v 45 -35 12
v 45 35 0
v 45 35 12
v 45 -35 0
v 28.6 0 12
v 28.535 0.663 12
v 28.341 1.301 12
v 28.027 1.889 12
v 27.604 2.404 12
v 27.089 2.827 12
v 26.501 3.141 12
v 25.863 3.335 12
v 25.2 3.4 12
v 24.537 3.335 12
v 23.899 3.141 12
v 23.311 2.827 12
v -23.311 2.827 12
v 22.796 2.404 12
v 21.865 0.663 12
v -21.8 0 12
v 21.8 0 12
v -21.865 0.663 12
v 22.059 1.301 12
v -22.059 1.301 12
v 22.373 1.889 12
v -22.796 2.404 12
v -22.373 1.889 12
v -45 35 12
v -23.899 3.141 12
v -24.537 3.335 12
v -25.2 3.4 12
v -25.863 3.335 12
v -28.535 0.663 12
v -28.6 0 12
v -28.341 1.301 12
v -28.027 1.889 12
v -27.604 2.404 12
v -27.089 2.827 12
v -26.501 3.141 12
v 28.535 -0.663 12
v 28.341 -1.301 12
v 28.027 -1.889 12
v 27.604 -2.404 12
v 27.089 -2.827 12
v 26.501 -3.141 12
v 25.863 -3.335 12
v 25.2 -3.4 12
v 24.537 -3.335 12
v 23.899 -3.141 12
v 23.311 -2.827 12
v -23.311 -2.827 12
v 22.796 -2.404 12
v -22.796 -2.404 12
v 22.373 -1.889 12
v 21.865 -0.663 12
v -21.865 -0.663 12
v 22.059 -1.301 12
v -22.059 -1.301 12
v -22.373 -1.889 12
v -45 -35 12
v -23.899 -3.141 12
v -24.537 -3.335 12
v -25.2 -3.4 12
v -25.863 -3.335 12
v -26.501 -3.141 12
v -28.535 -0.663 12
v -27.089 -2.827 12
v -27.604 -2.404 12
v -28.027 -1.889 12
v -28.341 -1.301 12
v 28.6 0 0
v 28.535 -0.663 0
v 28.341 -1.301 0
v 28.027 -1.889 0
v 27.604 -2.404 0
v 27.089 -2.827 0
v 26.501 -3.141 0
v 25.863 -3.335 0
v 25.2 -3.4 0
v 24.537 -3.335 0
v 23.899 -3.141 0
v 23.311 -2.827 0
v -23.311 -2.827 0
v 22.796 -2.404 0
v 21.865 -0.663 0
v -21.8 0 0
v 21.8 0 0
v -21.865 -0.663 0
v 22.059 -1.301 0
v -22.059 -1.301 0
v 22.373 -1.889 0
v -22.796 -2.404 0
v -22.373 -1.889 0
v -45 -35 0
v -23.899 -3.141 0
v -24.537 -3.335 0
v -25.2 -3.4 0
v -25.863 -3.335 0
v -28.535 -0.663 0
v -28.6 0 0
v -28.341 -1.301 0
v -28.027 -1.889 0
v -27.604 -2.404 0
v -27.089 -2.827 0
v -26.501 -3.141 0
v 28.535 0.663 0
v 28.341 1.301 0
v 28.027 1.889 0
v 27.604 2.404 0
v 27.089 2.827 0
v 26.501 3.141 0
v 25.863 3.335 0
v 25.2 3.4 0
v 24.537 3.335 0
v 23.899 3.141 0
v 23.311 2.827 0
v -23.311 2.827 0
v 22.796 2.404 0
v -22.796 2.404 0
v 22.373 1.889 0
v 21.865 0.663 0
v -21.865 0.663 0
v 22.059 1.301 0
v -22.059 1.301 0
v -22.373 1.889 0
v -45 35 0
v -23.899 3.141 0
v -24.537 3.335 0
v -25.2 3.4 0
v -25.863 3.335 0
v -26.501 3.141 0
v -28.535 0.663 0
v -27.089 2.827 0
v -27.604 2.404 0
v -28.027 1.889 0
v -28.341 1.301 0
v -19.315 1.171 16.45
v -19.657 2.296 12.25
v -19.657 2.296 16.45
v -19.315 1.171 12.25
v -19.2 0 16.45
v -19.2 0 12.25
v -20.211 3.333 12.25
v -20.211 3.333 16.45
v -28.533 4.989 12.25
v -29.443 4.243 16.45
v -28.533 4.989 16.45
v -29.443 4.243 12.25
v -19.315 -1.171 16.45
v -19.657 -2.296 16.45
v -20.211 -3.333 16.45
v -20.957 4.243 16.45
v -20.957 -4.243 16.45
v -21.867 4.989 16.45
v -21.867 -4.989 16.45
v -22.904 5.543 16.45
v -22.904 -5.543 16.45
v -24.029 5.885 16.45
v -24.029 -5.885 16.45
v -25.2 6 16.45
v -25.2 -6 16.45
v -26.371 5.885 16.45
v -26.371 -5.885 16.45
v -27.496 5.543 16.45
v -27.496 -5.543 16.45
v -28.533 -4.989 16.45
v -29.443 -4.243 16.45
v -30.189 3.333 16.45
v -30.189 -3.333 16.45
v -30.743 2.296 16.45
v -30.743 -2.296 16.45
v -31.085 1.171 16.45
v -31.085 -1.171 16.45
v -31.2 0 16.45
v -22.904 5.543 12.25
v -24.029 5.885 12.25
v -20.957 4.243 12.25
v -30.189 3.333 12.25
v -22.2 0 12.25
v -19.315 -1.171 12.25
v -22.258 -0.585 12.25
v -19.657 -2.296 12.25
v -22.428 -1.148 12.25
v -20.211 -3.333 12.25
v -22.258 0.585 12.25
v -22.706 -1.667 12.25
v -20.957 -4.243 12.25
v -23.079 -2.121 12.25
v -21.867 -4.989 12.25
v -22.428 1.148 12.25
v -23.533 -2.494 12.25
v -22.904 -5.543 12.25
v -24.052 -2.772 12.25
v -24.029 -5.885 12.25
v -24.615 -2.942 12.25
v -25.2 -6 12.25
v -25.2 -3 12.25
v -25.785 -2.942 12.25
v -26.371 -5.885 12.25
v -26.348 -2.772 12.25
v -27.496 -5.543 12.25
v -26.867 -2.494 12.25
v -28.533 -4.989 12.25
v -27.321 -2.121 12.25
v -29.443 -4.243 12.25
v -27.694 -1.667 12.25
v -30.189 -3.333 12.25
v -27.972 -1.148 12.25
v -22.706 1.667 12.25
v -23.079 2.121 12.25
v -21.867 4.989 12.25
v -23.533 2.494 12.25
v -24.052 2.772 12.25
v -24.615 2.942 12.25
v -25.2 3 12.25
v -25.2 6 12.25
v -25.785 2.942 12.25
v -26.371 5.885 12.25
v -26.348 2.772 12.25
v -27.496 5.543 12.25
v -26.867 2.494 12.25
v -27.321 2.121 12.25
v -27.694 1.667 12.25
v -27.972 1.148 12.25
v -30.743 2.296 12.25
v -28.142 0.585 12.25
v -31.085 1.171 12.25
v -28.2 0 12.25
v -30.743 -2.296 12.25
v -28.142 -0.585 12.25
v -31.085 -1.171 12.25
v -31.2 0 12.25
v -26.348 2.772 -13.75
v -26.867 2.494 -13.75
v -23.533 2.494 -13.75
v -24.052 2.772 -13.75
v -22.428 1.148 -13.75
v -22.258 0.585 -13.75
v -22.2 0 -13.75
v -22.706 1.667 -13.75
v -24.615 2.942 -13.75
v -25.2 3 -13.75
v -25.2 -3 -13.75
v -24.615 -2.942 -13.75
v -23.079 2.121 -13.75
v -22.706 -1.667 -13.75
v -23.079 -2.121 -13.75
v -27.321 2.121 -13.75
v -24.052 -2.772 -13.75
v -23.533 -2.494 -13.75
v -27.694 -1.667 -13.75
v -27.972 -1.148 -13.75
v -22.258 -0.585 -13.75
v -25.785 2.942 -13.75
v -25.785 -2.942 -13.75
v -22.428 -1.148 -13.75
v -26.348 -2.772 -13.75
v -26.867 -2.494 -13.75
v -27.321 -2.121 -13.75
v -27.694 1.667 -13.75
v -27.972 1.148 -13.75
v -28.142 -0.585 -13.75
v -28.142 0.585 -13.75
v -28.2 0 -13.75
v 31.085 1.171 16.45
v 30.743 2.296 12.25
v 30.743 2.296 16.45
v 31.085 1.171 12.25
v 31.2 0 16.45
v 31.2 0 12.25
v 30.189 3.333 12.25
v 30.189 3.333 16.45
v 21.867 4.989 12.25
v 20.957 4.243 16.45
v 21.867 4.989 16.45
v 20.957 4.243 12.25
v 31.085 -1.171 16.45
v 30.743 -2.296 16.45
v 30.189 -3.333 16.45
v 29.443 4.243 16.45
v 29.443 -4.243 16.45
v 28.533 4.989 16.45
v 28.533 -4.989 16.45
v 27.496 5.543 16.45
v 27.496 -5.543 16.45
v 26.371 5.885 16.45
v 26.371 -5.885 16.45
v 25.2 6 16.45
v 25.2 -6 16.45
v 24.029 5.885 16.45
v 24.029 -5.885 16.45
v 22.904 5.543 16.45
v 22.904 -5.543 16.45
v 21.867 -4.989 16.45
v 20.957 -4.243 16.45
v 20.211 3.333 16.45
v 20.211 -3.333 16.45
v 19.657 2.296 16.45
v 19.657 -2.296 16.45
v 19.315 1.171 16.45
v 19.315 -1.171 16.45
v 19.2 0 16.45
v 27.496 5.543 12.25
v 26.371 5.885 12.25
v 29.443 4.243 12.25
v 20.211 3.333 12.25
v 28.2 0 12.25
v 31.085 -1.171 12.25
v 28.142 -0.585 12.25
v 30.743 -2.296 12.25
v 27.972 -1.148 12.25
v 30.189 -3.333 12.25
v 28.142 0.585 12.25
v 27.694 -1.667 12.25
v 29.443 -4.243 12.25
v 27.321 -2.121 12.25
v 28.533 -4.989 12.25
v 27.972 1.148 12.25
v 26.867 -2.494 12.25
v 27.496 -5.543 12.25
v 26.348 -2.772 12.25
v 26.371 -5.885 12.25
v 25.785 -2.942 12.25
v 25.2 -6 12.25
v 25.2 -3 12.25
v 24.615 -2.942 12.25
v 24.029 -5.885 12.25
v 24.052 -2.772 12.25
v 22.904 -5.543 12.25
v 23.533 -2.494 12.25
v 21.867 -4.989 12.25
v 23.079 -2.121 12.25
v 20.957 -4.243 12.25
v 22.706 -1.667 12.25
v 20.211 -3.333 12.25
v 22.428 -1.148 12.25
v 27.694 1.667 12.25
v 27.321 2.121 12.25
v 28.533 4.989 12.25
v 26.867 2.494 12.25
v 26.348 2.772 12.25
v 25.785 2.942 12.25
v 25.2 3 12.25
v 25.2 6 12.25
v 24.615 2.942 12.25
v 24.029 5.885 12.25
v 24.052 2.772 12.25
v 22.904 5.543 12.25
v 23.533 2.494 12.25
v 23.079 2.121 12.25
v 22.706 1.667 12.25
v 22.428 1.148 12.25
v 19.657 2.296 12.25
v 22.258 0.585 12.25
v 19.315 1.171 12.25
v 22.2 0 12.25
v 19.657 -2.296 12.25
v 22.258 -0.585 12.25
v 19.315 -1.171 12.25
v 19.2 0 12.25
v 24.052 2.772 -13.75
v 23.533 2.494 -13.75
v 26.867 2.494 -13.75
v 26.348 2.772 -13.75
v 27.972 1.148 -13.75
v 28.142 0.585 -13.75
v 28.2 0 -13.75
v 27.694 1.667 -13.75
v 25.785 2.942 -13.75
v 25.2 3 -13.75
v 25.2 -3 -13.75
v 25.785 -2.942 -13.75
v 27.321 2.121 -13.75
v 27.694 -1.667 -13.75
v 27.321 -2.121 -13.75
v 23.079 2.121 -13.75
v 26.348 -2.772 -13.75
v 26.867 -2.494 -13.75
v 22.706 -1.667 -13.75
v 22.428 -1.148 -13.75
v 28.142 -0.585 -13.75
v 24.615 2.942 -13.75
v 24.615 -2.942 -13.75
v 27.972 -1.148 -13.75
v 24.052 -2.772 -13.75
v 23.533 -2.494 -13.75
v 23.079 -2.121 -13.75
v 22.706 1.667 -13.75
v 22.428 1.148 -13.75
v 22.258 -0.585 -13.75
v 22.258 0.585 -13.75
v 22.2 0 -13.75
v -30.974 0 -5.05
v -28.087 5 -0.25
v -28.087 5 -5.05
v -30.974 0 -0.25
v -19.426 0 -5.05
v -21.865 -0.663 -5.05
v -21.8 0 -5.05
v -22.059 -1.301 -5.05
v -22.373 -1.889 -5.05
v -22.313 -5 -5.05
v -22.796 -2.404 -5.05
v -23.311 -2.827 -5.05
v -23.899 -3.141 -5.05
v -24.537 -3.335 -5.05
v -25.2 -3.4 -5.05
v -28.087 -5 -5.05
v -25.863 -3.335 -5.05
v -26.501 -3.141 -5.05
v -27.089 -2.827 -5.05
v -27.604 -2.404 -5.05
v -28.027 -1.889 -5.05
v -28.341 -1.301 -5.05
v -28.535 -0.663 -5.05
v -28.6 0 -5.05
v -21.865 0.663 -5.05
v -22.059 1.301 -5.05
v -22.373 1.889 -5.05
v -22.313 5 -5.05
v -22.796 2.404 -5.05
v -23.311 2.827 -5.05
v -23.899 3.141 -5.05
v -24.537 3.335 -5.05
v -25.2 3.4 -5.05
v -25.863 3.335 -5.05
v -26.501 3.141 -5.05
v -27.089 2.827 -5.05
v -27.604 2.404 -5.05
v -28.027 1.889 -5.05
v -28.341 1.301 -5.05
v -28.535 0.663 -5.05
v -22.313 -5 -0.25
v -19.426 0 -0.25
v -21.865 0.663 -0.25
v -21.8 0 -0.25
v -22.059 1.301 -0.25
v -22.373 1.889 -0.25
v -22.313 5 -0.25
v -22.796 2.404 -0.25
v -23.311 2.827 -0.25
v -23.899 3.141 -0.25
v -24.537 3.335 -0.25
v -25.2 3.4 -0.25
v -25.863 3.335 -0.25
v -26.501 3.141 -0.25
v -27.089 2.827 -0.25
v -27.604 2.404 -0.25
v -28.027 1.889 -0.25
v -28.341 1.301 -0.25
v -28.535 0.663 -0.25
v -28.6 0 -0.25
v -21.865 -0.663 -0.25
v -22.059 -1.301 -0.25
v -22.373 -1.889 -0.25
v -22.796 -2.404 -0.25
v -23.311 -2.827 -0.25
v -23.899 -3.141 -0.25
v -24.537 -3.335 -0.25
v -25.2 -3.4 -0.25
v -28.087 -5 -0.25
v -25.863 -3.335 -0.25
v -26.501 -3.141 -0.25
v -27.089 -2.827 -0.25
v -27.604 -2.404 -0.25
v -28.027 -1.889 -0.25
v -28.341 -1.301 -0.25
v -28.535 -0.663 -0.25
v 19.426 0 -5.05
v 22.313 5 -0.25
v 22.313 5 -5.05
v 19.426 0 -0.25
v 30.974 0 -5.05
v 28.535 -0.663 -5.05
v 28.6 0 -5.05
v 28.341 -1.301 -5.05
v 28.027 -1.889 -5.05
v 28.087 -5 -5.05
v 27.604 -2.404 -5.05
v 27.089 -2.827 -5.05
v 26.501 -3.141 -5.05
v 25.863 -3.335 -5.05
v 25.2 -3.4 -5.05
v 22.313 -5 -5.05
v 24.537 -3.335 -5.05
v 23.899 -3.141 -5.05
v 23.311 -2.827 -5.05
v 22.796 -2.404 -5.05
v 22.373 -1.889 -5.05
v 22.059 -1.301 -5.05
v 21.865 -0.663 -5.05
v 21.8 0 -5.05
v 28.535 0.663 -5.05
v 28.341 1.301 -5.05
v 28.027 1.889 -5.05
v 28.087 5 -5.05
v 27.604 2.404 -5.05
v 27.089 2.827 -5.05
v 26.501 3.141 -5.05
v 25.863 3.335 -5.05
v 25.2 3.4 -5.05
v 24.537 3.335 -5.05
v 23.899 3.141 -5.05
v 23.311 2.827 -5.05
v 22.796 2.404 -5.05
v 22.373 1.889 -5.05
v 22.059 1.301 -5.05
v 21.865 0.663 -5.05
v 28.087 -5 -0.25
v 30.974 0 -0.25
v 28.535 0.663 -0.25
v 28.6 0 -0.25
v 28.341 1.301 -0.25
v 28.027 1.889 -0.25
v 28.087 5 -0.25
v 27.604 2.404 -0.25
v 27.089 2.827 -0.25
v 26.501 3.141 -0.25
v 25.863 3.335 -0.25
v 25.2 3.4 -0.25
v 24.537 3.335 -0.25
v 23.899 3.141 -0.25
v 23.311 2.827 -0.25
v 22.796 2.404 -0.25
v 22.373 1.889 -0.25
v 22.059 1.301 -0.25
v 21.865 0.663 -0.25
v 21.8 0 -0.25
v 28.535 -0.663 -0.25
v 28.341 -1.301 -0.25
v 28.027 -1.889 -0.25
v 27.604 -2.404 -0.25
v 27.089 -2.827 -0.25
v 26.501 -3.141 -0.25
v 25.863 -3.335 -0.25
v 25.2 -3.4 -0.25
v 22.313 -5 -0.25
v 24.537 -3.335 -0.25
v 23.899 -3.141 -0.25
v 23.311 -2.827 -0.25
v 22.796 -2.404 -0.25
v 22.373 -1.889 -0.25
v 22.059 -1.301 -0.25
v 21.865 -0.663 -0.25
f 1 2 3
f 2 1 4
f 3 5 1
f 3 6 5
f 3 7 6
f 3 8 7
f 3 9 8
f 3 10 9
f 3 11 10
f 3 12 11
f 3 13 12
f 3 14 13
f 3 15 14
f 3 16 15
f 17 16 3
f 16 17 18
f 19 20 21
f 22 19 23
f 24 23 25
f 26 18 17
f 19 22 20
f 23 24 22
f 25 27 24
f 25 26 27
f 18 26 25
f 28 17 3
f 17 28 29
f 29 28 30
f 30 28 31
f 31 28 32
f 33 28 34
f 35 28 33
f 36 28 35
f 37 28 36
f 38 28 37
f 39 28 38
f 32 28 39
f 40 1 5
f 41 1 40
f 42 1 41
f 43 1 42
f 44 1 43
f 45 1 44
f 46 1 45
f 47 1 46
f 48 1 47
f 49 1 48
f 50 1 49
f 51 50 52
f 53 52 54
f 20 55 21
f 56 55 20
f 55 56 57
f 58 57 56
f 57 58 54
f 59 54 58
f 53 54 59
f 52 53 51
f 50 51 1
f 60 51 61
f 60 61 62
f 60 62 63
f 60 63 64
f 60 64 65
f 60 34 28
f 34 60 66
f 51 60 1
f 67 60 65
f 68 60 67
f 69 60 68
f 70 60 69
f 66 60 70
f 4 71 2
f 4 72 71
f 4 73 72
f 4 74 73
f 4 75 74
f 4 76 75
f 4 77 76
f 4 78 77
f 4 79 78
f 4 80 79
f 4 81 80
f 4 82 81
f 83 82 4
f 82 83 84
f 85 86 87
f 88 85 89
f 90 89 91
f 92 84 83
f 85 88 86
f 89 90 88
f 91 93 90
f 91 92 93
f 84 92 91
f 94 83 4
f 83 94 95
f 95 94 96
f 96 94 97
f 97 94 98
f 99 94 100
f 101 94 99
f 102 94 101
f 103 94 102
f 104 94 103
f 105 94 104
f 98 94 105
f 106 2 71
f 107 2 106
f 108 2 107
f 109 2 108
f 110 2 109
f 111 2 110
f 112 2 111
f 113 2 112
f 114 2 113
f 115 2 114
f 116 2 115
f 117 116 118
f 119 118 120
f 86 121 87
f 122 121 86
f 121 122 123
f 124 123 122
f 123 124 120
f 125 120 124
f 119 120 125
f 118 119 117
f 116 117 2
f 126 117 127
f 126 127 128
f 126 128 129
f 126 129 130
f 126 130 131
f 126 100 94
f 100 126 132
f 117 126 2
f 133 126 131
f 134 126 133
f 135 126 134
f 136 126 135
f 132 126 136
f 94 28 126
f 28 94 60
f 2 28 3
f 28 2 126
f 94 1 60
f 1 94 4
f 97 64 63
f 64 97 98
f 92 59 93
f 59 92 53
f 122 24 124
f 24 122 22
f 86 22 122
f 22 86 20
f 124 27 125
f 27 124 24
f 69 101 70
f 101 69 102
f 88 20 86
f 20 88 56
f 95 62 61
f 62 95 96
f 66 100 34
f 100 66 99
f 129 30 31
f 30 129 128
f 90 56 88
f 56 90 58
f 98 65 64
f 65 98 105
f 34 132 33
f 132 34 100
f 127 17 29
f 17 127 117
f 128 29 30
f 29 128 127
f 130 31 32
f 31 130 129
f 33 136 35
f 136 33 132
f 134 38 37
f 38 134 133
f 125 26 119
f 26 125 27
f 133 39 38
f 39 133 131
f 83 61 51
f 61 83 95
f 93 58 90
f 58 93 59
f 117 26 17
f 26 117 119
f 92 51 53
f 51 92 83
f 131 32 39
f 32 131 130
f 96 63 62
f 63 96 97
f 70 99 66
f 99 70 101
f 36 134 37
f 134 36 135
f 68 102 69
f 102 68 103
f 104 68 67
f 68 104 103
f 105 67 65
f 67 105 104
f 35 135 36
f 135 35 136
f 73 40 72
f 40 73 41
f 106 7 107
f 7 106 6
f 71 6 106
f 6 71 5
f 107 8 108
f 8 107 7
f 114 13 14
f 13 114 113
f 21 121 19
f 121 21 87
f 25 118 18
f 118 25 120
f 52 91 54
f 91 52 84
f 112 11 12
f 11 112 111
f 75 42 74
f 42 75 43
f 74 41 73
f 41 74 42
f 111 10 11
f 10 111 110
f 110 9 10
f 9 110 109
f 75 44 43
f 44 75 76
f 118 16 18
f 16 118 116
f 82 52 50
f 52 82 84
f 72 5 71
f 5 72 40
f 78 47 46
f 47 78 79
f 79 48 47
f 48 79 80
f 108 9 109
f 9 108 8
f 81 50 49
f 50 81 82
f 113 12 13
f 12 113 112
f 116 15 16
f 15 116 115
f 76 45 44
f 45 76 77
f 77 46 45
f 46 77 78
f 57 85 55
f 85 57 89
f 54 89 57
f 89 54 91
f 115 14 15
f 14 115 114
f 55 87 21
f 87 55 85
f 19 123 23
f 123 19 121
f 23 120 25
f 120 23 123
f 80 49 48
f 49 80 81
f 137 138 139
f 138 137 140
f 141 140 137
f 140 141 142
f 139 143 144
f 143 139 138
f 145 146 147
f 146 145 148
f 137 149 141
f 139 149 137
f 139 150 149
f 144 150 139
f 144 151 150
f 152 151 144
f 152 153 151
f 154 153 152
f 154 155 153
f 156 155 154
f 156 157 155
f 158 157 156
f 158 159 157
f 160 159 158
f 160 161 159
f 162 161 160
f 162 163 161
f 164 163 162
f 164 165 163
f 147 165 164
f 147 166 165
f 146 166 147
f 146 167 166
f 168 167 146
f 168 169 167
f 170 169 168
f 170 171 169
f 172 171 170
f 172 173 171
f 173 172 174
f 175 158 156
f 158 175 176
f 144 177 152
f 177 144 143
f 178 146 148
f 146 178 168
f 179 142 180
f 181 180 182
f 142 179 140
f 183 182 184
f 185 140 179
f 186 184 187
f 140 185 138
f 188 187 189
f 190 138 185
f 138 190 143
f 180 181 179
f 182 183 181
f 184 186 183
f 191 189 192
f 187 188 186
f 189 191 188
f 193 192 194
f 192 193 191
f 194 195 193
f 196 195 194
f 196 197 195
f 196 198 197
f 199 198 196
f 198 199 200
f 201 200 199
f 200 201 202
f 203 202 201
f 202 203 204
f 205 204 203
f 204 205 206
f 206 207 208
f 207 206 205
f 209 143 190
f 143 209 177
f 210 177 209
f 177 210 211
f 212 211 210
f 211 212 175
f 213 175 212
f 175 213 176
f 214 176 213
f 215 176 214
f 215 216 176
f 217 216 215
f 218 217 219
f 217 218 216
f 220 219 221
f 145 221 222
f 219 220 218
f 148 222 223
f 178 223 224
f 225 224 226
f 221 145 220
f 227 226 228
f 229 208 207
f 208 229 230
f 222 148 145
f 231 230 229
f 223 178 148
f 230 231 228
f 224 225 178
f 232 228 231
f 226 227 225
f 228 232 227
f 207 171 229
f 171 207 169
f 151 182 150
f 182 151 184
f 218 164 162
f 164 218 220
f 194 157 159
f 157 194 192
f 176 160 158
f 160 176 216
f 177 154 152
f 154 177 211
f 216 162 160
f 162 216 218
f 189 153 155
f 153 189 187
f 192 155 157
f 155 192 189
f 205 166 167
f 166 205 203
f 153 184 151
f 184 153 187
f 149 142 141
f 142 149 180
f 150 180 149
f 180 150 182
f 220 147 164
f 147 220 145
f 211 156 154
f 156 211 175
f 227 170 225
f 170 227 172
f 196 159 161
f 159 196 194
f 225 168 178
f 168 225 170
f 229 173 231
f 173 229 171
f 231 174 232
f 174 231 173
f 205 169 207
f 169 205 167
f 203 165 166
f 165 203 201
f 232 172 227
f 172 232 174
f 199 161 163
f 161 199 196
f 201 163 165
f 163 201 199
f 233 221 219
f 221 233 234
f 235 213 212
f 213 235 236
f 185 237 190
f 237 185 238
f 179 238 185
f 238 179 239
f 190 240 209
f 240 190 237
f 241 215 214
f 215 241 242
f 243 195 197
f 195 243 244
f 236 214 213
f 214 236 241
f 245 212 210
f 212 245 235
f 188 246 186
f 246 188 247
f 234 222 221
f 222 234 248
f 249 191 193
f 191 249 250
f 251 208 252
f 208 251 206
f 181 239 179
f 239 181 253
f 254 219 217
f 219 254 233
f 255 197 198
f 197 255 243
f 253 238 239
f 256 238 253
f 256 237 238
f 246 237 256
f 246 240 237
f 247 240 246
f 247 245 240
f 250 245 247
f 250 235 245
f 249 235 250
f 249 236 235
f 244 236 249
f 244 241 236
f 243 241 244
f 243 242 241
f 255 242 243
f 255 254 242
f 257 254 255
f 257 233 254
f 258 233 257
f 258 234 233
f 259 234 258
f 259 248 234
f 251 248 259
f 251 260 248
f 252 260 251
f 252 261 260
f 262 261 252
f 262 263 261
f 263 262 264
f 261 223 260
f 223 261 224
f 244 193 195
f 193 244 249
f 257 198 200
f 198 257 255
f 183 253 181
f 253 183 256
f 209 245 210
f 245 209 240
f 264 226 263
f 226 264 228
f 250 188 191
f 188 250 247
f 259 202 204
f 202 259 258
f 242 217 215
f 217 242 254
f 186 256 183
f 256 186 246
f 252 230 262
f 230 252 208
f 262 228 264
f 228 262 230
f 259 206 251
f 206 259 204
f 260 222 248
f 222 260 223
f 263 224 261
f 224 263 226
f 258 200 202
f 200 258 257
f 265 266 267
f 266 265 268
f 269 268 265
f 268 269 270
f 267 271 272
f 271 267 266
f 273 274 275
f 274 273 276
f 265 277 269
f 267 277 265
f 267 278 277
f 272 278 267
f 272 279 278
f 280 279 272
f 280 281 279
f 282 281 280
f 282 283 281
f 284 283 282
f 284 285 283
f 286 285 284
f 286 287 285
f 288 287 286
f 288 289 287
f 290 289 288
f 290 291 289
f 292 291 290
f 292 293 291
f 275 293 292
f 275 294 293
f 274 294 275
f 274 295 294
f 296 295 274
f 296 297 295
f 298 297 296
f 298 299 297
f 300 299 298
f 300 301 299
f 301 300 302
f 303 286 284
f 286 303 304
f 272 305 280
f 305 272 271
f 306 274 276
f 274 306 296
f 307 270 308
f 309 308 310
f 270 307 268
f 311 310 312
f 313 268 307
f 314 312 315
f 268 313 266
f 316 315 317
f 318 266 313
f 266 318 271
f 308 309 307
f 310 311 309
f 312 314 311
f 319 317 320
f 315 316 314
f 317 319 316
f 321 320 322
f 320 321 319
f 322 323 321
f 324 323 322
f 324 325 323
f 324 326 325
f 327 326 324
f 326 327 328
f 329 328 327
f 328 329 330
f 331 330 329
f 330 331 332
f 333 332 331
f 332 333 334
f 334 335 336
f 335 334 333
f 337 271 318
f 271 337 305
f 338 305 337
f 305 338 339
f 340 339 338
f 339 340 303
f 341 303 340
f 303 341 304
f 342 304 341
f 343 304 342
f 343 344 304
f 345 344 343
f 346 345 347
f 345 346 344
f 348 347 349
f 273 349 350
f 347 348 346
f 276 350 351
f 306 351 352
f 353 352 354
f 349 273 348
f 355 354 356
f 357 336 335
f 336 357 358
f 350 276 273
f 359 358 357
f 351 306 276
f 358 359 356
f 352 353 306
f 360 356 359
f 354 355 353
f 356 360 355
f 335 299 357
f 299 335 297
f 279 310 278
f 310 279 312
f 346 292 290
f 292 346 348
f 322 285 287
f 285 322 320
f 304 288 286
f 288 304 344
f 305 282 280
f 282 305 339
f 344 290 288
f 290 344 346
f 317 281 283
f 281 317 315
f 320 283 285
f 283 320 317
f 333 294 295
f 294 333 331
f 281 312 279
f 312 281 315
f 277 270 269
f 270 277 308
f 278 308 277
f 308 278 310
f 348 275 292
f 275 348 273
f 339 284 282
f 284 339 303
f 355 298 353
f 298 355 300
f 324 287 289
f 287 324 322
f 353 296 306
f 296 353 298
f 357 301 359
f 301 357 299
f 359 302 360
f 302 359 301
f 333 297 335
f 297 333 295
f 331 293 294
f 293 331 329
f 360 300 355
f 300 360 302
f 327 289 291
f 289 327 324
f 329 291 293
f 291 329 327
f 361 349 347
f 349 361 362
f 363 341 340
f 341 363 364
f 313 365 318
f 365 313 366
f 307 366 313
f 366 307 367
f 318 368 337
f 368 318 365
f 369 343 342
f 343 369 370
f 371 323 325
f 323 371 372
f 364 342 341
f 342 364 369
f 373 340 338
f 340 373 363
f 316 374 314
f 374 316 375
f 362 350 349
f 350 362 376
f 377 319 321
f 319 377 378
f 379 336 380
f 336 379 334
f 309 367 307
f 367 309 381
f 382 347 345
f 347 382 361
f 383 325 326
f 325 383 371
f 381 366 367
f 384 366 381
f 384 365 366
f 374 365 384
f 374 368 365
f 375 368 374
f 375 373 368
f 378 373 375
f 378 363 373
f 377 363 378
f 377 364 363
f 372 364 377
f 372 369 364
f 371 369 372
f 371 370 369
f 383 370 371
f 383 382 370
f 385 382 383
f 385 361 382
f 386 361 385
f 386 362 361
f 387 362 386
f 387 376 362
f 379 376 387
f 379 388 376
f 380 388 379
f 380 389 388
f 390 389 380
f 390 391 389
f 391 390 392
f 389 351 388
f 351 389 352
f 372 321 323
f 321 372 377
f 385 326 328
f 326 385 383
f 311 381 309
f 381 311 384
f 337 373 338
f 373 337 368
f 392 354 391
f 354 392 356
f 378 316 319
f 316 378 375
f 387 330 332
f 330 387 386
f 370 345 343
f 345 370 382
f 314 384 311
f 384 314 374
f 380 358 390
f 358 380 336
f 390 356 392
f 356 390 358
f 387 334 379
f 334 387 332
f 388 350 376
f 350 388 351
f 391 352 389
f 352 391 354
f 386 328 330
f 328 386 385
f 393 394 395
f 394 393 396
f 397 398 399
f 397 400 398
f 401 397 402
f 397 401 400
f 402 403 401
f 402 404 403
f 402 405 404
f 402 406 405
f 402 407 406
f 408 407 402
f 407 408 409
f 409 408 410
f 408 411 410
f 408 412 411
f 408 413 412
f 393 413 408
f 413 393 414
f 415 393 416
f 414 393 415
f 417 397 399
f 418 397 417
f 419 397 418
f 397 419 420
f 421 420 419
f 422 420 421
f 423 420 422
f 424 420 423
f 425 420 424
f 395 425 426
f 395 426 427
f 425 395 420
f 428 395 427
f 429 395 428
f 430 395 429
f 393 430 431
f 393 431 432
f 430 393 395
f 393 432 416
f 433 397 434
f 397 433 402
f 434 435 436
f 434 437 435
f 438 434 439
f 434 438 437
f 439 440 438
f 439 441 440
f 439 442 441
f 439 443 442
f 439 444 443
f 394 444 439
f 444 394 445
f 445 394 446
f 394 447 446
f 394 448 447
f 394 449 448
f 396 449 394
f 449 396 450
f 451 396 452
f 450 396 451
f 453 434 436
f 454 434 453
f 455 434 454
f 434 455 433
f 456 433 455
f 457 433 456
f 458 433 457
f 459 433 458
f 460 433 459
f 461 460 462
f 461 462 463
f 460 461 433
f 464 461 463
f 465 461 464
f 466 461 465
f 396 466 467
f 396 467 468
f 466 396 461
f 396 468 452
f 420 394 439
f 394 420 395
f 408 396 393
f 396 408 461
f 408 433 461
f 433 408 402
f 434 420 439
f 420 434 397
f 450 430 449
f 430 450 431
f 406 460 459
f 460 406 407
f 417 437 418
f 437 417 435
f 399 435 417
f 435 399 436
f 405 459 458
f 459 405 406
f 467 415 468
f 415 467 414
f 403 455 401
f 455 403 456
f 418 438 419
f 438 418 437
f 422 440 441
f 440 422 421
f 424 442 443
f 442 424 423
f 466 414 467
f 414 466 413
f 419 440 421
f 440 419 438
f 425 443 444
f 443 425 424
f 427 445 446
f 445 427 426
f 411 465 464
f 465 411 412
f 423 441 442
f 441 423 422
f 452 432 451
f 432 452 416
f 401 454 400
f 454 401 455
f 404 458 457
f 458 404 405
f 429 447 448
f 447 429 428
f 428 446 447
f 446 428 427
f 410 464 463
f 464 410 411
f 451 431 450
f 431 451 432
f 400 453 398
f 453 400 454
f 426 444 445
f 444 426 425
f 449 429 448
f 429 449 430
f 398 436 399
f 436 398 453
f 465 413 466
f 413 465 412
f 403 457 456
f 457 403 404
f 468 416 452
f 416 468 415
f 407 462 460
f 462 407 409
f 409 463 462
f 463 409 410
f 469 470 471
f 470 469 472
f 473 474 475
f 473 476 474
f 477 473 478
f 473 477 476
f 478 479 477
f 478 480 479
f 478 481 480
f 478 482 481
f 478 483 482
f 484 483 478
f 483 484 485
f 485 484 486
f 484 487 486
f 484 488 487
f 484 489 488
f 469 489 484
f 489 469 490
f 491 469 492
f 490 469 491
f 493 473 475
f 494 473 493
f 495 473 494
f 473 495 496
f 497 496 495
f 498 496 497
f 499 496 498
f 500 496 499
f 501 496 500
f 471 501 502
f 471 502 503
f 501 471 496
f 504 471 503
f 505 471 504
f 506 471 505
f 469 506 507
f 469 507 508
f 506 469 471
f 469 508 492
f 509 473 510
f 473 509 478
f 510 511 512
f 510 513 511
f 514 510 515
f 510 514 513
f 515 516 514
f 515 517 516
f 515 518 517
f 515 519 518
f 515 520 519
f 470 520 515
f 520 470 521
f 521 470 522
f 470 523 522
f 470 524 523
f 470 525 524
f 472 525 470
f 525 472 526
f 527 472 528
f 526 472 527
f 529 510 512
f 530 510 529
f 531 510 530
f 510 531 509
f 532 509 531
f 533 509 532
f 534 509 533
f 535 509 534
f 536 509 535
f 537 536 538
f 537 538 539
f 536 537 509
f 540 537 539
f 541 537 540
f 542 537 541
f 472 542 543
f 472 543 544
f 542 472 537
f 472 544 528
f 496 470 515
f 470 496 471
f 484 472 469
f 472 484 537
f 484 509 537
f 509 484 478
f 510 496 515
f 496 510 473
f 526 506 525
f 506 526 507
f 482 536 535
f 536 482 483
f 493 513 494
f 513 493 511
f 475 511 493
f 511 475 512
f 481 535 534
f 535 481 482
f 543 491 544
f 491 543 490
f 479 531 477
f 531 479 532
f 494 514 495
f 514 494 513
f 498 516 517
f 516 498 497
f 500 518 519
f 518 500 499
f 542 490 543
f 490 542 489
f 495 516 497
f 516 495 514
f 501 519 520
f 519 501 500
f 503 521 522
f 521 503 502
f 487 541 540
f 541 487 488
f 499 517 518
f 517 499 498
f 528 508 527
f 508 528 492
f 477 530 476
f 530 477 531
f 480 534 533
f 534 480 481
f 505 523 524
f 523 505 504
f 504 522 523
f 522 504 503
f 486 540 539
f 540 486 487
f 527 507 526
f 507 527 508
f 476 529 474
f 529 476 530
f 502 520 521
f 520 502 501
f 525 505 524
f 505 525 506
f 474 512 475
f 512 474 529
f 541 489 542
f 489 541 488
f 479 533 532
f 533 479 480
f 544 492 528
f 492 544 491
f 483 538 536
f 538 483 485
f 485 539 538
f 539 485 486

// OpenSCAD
$fn = 32;

// ------------------------------------------------------------------------
// Bolted plate: 90 x 70 x 12 mm plate, 2 fasteners
// Every part is its own module, assembly() places them once.
// ------------------------------------------------------------------------

// --- part 1 ---
module plate() {
  difference() {
    translate([-45, -35, 0]) cube([90, 70, 12]);
    translate([-25.2, 0, -1]) cylinder(h = 14, d = 6.8);
    translate([25.2, 0, -1]) cylinder(h = 14, d = 6.8);
  }
}

// --- part 2 ---
module bolt1() {
  cylinder(h = 4.2, d = 12);
  translate([0, 0, -26]) cylinder(h = 26, d = 6);
}

// --- part 3 ---
module bolt2() {
  cylinder(h = 4.2, d = 12);
  translate([0, 0, -26]) cylinder(h = 26, d = 6);
}

// --- part 4 ---
module nut1() {
  difference() {
    linear_extrude(height = 4.8) polygon(points = [[5.774, 0], [2.887, 5], [-2.887, 5], [-5.774, 0], [-2.887, -5], [2.887, -5]]);
    translate([0, 0, -1]) cylinder(h = 6.8, d = 6.8);
  }
}

// --- part 5 ---
module nut2() {
  difference() {
    linear_extrude(height = 4.8) polygon(points = [[5.774, 0], [2.887, 5], [-2.887, 5], [-5.774, 0], [-2.887, -5], [2.887, -5]]);
    translate([0, 0, -1]) cylinder(h = 6.8, d = 6.8);
  }
}

// --- assembly ---
module assembly() {
  translate([0, 0, 0]) rotate([0, 0, 0]) plate();
  translate([-25.2, 0, 12.25]) rotate([0, 0, 0]) bolt1();
  translate([25.2, 0, 12.25]) rotate([0, 0, 0]) bolt2();
  translate([-25.2, 0, -5.05]) rotate([0, 0, 0]) nut1();
  translate([25.2, 0, -5.05]) rotate([0, 0, 0]) nut2();
}

assembly();
